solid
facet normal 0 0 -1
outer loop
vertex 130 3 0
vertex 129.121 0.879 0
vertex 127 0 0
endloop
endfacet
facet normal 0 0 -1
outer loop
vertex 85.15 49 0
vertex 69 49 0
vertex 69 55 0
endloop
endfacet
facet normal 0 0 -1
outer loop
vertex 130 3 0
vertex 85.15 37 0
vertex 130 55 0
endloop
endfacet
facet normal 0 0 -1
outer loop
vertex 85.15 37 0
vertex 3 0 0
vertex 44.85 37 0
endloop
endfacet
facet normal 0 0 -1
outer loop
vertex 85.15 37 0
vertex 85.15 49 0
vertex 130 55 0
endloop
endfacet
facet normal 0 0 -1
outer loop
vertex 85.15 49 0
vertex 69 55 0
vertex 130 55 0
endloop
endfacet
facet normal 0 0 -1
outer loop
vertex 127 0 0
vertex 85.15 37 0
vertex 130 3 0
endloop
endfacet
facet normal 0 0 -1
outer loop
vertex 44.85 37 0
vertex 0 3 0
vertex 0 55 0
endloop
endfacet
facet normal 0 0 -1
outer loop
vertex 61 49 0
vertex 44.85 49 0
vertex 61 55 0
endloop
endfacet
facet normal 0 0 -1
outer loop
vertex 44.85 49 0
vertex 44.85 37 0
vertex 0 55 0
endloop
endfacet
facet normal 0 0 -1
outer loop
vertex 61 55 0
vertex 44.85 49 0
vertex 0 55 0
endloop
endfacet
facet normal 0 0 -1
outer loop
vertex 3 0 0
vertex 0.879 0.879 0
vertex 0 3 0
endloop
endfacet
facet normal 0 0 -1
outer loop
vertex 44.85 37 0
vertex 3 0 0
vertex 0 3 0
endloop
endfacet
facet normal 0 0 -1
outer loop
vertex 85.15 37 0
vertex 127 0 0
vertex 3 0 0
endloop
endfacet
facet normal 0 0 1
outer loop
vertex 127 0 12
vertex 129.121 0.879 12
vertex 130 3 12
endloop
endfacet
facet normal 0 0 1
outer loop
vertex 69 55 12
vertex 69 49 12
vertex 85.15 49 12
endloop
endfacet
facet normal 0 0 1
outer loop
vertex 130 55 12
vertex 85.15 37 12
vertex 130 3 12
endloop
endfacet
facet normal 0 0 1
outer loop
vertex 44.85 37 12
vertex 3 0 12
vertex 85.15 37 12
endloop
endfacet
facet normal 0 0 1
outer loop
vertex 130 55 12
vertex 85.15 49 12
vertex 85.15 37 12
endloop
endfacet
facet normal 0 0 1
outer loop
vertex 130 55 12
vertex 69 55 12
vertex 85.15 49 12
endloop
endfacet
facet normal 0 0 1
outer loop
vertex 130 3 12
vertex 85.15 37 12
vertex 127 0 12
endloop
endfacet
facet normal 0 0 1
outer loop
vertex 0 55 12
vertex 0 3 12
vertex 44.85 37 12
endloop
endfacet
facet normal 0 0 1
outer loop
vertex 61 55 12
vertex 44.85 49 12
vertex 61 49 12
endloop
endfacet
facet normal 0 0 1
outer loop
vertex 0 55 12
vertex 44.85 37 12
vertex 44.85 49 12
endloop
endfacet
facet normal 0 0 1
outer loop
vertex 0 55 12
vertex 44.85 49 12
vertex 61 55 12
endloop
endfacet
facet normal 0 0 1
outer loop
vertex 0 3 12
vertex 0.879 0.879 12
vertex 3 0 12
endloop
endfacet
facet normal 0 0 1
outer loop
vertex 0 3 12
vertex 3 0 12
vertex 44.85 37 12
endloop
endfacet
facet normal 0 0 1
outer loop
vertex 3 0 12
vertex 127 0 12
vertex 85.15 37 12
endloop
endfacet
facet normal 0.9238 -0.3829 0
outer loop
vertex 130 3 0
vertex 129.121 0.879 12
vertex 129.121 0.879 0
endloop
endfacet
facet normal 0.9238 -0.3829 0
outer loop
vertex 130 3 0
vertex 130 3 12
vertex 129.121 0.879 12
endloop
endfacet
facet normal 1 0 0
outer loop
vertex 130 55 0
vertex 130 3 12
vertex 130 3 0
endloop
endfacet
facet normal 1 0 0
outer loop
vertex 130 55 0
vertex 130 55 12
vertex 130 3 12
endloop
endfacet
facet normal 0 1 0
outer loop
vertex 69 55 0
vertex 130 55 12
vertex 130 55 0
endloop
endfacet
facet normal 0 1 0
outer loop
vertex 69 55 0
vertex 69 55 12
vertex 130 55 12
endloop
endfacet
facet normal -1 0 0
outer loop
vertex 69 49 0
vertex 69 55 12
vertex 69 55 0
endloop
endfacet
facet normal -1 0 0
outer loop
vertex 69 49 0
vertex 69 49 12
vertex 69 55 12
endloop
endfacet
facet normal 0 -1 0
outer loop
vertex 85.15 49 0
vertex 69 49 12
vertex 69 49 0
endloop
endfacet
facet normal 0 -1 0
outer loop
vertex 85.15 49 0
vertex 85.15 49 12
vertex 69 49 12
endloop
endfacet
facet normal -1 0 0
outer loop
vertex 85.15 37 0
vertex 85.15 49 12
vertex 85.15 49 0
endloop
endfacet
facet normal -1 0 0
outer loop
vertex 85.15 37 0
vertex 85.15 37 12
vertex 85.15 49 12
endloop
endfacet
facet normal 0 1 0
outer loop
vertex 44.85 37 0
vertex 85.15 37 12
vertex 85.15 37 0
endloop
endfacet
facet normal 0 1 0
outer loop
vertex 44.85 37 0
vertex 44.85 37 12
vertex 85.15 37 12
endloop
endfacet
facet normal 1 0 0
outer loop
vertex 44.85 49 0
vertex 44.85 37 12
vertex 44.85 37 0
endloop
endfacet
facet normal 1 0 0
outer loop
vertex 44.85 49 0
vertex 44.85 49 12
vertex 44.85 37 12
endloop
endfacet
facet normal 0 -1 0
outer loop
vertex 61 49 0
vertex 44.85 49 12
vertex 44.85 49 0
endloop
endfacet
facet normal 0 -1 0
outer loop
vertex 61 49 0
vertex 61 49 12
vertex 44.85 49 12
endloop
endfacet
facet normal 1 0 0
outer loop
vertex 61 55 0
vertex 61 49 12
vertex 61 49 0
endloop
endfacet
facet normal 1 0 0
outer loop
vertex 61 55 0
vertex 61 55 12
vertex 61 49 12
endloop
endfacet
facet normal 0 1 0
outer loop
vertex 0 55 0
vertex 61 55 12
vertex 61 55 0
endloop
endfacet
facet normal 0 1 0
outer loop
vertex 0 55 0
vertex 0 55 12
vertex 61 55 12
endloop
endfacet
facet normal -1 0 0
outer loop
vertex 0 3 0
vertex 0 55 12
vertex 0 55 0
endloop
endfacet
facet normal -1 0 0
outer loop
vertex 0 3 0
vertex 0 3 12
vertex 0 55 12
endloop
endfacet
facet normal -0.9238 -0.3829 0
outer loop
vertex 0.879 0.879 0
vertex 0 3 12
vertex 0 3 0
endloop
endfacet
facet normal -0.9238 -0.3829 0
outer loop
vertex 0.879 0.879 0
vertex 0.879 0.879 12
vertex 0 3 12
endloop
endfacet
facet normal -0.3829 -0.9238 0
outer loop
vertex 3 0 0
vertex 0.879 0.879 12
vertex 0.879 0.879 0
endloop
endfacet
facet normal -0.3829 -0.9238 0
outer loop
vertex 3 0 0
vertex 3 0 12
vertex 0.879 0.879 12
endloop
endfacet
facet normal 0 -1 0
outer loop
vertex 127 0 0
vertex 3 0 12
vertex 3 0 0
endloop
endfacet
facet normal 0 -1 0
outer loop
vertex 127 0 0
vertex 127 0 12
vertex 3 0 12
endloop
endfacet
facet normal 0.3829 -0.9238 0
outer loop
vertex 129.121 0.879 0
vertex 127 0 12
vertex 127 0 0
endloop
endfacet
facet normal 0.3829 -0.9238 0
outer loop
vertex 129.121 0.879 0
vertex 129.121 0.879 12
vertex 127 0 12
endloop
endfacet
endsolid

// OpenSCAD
$fn = 32;

// ----------------------------------------------------------------------
// Window plate: 130 x 55 mm, 1 open windows
// ----------------------------------------------------------------------

// --- parameters (mm) ---
profile_height = 12;      // extrusion height
profile_points = 16;      // points of the closed outline

profile = [[0, 3], [0.879, 0.879], [3, 0], [127, 0], [129.121, 0.879], [130, 3], [130, 55], [69, 55], [69, 49], [85.15, 49], [85.15, 37], [44.85, 37], [44.85, 49], [61, 49], [61, 55], [0, 55]];  // single closed polygon, 16 points, counter clockwise

// --- the one profile operation ---
linear_extrude(height = profile_height) polygon(points = profile);
